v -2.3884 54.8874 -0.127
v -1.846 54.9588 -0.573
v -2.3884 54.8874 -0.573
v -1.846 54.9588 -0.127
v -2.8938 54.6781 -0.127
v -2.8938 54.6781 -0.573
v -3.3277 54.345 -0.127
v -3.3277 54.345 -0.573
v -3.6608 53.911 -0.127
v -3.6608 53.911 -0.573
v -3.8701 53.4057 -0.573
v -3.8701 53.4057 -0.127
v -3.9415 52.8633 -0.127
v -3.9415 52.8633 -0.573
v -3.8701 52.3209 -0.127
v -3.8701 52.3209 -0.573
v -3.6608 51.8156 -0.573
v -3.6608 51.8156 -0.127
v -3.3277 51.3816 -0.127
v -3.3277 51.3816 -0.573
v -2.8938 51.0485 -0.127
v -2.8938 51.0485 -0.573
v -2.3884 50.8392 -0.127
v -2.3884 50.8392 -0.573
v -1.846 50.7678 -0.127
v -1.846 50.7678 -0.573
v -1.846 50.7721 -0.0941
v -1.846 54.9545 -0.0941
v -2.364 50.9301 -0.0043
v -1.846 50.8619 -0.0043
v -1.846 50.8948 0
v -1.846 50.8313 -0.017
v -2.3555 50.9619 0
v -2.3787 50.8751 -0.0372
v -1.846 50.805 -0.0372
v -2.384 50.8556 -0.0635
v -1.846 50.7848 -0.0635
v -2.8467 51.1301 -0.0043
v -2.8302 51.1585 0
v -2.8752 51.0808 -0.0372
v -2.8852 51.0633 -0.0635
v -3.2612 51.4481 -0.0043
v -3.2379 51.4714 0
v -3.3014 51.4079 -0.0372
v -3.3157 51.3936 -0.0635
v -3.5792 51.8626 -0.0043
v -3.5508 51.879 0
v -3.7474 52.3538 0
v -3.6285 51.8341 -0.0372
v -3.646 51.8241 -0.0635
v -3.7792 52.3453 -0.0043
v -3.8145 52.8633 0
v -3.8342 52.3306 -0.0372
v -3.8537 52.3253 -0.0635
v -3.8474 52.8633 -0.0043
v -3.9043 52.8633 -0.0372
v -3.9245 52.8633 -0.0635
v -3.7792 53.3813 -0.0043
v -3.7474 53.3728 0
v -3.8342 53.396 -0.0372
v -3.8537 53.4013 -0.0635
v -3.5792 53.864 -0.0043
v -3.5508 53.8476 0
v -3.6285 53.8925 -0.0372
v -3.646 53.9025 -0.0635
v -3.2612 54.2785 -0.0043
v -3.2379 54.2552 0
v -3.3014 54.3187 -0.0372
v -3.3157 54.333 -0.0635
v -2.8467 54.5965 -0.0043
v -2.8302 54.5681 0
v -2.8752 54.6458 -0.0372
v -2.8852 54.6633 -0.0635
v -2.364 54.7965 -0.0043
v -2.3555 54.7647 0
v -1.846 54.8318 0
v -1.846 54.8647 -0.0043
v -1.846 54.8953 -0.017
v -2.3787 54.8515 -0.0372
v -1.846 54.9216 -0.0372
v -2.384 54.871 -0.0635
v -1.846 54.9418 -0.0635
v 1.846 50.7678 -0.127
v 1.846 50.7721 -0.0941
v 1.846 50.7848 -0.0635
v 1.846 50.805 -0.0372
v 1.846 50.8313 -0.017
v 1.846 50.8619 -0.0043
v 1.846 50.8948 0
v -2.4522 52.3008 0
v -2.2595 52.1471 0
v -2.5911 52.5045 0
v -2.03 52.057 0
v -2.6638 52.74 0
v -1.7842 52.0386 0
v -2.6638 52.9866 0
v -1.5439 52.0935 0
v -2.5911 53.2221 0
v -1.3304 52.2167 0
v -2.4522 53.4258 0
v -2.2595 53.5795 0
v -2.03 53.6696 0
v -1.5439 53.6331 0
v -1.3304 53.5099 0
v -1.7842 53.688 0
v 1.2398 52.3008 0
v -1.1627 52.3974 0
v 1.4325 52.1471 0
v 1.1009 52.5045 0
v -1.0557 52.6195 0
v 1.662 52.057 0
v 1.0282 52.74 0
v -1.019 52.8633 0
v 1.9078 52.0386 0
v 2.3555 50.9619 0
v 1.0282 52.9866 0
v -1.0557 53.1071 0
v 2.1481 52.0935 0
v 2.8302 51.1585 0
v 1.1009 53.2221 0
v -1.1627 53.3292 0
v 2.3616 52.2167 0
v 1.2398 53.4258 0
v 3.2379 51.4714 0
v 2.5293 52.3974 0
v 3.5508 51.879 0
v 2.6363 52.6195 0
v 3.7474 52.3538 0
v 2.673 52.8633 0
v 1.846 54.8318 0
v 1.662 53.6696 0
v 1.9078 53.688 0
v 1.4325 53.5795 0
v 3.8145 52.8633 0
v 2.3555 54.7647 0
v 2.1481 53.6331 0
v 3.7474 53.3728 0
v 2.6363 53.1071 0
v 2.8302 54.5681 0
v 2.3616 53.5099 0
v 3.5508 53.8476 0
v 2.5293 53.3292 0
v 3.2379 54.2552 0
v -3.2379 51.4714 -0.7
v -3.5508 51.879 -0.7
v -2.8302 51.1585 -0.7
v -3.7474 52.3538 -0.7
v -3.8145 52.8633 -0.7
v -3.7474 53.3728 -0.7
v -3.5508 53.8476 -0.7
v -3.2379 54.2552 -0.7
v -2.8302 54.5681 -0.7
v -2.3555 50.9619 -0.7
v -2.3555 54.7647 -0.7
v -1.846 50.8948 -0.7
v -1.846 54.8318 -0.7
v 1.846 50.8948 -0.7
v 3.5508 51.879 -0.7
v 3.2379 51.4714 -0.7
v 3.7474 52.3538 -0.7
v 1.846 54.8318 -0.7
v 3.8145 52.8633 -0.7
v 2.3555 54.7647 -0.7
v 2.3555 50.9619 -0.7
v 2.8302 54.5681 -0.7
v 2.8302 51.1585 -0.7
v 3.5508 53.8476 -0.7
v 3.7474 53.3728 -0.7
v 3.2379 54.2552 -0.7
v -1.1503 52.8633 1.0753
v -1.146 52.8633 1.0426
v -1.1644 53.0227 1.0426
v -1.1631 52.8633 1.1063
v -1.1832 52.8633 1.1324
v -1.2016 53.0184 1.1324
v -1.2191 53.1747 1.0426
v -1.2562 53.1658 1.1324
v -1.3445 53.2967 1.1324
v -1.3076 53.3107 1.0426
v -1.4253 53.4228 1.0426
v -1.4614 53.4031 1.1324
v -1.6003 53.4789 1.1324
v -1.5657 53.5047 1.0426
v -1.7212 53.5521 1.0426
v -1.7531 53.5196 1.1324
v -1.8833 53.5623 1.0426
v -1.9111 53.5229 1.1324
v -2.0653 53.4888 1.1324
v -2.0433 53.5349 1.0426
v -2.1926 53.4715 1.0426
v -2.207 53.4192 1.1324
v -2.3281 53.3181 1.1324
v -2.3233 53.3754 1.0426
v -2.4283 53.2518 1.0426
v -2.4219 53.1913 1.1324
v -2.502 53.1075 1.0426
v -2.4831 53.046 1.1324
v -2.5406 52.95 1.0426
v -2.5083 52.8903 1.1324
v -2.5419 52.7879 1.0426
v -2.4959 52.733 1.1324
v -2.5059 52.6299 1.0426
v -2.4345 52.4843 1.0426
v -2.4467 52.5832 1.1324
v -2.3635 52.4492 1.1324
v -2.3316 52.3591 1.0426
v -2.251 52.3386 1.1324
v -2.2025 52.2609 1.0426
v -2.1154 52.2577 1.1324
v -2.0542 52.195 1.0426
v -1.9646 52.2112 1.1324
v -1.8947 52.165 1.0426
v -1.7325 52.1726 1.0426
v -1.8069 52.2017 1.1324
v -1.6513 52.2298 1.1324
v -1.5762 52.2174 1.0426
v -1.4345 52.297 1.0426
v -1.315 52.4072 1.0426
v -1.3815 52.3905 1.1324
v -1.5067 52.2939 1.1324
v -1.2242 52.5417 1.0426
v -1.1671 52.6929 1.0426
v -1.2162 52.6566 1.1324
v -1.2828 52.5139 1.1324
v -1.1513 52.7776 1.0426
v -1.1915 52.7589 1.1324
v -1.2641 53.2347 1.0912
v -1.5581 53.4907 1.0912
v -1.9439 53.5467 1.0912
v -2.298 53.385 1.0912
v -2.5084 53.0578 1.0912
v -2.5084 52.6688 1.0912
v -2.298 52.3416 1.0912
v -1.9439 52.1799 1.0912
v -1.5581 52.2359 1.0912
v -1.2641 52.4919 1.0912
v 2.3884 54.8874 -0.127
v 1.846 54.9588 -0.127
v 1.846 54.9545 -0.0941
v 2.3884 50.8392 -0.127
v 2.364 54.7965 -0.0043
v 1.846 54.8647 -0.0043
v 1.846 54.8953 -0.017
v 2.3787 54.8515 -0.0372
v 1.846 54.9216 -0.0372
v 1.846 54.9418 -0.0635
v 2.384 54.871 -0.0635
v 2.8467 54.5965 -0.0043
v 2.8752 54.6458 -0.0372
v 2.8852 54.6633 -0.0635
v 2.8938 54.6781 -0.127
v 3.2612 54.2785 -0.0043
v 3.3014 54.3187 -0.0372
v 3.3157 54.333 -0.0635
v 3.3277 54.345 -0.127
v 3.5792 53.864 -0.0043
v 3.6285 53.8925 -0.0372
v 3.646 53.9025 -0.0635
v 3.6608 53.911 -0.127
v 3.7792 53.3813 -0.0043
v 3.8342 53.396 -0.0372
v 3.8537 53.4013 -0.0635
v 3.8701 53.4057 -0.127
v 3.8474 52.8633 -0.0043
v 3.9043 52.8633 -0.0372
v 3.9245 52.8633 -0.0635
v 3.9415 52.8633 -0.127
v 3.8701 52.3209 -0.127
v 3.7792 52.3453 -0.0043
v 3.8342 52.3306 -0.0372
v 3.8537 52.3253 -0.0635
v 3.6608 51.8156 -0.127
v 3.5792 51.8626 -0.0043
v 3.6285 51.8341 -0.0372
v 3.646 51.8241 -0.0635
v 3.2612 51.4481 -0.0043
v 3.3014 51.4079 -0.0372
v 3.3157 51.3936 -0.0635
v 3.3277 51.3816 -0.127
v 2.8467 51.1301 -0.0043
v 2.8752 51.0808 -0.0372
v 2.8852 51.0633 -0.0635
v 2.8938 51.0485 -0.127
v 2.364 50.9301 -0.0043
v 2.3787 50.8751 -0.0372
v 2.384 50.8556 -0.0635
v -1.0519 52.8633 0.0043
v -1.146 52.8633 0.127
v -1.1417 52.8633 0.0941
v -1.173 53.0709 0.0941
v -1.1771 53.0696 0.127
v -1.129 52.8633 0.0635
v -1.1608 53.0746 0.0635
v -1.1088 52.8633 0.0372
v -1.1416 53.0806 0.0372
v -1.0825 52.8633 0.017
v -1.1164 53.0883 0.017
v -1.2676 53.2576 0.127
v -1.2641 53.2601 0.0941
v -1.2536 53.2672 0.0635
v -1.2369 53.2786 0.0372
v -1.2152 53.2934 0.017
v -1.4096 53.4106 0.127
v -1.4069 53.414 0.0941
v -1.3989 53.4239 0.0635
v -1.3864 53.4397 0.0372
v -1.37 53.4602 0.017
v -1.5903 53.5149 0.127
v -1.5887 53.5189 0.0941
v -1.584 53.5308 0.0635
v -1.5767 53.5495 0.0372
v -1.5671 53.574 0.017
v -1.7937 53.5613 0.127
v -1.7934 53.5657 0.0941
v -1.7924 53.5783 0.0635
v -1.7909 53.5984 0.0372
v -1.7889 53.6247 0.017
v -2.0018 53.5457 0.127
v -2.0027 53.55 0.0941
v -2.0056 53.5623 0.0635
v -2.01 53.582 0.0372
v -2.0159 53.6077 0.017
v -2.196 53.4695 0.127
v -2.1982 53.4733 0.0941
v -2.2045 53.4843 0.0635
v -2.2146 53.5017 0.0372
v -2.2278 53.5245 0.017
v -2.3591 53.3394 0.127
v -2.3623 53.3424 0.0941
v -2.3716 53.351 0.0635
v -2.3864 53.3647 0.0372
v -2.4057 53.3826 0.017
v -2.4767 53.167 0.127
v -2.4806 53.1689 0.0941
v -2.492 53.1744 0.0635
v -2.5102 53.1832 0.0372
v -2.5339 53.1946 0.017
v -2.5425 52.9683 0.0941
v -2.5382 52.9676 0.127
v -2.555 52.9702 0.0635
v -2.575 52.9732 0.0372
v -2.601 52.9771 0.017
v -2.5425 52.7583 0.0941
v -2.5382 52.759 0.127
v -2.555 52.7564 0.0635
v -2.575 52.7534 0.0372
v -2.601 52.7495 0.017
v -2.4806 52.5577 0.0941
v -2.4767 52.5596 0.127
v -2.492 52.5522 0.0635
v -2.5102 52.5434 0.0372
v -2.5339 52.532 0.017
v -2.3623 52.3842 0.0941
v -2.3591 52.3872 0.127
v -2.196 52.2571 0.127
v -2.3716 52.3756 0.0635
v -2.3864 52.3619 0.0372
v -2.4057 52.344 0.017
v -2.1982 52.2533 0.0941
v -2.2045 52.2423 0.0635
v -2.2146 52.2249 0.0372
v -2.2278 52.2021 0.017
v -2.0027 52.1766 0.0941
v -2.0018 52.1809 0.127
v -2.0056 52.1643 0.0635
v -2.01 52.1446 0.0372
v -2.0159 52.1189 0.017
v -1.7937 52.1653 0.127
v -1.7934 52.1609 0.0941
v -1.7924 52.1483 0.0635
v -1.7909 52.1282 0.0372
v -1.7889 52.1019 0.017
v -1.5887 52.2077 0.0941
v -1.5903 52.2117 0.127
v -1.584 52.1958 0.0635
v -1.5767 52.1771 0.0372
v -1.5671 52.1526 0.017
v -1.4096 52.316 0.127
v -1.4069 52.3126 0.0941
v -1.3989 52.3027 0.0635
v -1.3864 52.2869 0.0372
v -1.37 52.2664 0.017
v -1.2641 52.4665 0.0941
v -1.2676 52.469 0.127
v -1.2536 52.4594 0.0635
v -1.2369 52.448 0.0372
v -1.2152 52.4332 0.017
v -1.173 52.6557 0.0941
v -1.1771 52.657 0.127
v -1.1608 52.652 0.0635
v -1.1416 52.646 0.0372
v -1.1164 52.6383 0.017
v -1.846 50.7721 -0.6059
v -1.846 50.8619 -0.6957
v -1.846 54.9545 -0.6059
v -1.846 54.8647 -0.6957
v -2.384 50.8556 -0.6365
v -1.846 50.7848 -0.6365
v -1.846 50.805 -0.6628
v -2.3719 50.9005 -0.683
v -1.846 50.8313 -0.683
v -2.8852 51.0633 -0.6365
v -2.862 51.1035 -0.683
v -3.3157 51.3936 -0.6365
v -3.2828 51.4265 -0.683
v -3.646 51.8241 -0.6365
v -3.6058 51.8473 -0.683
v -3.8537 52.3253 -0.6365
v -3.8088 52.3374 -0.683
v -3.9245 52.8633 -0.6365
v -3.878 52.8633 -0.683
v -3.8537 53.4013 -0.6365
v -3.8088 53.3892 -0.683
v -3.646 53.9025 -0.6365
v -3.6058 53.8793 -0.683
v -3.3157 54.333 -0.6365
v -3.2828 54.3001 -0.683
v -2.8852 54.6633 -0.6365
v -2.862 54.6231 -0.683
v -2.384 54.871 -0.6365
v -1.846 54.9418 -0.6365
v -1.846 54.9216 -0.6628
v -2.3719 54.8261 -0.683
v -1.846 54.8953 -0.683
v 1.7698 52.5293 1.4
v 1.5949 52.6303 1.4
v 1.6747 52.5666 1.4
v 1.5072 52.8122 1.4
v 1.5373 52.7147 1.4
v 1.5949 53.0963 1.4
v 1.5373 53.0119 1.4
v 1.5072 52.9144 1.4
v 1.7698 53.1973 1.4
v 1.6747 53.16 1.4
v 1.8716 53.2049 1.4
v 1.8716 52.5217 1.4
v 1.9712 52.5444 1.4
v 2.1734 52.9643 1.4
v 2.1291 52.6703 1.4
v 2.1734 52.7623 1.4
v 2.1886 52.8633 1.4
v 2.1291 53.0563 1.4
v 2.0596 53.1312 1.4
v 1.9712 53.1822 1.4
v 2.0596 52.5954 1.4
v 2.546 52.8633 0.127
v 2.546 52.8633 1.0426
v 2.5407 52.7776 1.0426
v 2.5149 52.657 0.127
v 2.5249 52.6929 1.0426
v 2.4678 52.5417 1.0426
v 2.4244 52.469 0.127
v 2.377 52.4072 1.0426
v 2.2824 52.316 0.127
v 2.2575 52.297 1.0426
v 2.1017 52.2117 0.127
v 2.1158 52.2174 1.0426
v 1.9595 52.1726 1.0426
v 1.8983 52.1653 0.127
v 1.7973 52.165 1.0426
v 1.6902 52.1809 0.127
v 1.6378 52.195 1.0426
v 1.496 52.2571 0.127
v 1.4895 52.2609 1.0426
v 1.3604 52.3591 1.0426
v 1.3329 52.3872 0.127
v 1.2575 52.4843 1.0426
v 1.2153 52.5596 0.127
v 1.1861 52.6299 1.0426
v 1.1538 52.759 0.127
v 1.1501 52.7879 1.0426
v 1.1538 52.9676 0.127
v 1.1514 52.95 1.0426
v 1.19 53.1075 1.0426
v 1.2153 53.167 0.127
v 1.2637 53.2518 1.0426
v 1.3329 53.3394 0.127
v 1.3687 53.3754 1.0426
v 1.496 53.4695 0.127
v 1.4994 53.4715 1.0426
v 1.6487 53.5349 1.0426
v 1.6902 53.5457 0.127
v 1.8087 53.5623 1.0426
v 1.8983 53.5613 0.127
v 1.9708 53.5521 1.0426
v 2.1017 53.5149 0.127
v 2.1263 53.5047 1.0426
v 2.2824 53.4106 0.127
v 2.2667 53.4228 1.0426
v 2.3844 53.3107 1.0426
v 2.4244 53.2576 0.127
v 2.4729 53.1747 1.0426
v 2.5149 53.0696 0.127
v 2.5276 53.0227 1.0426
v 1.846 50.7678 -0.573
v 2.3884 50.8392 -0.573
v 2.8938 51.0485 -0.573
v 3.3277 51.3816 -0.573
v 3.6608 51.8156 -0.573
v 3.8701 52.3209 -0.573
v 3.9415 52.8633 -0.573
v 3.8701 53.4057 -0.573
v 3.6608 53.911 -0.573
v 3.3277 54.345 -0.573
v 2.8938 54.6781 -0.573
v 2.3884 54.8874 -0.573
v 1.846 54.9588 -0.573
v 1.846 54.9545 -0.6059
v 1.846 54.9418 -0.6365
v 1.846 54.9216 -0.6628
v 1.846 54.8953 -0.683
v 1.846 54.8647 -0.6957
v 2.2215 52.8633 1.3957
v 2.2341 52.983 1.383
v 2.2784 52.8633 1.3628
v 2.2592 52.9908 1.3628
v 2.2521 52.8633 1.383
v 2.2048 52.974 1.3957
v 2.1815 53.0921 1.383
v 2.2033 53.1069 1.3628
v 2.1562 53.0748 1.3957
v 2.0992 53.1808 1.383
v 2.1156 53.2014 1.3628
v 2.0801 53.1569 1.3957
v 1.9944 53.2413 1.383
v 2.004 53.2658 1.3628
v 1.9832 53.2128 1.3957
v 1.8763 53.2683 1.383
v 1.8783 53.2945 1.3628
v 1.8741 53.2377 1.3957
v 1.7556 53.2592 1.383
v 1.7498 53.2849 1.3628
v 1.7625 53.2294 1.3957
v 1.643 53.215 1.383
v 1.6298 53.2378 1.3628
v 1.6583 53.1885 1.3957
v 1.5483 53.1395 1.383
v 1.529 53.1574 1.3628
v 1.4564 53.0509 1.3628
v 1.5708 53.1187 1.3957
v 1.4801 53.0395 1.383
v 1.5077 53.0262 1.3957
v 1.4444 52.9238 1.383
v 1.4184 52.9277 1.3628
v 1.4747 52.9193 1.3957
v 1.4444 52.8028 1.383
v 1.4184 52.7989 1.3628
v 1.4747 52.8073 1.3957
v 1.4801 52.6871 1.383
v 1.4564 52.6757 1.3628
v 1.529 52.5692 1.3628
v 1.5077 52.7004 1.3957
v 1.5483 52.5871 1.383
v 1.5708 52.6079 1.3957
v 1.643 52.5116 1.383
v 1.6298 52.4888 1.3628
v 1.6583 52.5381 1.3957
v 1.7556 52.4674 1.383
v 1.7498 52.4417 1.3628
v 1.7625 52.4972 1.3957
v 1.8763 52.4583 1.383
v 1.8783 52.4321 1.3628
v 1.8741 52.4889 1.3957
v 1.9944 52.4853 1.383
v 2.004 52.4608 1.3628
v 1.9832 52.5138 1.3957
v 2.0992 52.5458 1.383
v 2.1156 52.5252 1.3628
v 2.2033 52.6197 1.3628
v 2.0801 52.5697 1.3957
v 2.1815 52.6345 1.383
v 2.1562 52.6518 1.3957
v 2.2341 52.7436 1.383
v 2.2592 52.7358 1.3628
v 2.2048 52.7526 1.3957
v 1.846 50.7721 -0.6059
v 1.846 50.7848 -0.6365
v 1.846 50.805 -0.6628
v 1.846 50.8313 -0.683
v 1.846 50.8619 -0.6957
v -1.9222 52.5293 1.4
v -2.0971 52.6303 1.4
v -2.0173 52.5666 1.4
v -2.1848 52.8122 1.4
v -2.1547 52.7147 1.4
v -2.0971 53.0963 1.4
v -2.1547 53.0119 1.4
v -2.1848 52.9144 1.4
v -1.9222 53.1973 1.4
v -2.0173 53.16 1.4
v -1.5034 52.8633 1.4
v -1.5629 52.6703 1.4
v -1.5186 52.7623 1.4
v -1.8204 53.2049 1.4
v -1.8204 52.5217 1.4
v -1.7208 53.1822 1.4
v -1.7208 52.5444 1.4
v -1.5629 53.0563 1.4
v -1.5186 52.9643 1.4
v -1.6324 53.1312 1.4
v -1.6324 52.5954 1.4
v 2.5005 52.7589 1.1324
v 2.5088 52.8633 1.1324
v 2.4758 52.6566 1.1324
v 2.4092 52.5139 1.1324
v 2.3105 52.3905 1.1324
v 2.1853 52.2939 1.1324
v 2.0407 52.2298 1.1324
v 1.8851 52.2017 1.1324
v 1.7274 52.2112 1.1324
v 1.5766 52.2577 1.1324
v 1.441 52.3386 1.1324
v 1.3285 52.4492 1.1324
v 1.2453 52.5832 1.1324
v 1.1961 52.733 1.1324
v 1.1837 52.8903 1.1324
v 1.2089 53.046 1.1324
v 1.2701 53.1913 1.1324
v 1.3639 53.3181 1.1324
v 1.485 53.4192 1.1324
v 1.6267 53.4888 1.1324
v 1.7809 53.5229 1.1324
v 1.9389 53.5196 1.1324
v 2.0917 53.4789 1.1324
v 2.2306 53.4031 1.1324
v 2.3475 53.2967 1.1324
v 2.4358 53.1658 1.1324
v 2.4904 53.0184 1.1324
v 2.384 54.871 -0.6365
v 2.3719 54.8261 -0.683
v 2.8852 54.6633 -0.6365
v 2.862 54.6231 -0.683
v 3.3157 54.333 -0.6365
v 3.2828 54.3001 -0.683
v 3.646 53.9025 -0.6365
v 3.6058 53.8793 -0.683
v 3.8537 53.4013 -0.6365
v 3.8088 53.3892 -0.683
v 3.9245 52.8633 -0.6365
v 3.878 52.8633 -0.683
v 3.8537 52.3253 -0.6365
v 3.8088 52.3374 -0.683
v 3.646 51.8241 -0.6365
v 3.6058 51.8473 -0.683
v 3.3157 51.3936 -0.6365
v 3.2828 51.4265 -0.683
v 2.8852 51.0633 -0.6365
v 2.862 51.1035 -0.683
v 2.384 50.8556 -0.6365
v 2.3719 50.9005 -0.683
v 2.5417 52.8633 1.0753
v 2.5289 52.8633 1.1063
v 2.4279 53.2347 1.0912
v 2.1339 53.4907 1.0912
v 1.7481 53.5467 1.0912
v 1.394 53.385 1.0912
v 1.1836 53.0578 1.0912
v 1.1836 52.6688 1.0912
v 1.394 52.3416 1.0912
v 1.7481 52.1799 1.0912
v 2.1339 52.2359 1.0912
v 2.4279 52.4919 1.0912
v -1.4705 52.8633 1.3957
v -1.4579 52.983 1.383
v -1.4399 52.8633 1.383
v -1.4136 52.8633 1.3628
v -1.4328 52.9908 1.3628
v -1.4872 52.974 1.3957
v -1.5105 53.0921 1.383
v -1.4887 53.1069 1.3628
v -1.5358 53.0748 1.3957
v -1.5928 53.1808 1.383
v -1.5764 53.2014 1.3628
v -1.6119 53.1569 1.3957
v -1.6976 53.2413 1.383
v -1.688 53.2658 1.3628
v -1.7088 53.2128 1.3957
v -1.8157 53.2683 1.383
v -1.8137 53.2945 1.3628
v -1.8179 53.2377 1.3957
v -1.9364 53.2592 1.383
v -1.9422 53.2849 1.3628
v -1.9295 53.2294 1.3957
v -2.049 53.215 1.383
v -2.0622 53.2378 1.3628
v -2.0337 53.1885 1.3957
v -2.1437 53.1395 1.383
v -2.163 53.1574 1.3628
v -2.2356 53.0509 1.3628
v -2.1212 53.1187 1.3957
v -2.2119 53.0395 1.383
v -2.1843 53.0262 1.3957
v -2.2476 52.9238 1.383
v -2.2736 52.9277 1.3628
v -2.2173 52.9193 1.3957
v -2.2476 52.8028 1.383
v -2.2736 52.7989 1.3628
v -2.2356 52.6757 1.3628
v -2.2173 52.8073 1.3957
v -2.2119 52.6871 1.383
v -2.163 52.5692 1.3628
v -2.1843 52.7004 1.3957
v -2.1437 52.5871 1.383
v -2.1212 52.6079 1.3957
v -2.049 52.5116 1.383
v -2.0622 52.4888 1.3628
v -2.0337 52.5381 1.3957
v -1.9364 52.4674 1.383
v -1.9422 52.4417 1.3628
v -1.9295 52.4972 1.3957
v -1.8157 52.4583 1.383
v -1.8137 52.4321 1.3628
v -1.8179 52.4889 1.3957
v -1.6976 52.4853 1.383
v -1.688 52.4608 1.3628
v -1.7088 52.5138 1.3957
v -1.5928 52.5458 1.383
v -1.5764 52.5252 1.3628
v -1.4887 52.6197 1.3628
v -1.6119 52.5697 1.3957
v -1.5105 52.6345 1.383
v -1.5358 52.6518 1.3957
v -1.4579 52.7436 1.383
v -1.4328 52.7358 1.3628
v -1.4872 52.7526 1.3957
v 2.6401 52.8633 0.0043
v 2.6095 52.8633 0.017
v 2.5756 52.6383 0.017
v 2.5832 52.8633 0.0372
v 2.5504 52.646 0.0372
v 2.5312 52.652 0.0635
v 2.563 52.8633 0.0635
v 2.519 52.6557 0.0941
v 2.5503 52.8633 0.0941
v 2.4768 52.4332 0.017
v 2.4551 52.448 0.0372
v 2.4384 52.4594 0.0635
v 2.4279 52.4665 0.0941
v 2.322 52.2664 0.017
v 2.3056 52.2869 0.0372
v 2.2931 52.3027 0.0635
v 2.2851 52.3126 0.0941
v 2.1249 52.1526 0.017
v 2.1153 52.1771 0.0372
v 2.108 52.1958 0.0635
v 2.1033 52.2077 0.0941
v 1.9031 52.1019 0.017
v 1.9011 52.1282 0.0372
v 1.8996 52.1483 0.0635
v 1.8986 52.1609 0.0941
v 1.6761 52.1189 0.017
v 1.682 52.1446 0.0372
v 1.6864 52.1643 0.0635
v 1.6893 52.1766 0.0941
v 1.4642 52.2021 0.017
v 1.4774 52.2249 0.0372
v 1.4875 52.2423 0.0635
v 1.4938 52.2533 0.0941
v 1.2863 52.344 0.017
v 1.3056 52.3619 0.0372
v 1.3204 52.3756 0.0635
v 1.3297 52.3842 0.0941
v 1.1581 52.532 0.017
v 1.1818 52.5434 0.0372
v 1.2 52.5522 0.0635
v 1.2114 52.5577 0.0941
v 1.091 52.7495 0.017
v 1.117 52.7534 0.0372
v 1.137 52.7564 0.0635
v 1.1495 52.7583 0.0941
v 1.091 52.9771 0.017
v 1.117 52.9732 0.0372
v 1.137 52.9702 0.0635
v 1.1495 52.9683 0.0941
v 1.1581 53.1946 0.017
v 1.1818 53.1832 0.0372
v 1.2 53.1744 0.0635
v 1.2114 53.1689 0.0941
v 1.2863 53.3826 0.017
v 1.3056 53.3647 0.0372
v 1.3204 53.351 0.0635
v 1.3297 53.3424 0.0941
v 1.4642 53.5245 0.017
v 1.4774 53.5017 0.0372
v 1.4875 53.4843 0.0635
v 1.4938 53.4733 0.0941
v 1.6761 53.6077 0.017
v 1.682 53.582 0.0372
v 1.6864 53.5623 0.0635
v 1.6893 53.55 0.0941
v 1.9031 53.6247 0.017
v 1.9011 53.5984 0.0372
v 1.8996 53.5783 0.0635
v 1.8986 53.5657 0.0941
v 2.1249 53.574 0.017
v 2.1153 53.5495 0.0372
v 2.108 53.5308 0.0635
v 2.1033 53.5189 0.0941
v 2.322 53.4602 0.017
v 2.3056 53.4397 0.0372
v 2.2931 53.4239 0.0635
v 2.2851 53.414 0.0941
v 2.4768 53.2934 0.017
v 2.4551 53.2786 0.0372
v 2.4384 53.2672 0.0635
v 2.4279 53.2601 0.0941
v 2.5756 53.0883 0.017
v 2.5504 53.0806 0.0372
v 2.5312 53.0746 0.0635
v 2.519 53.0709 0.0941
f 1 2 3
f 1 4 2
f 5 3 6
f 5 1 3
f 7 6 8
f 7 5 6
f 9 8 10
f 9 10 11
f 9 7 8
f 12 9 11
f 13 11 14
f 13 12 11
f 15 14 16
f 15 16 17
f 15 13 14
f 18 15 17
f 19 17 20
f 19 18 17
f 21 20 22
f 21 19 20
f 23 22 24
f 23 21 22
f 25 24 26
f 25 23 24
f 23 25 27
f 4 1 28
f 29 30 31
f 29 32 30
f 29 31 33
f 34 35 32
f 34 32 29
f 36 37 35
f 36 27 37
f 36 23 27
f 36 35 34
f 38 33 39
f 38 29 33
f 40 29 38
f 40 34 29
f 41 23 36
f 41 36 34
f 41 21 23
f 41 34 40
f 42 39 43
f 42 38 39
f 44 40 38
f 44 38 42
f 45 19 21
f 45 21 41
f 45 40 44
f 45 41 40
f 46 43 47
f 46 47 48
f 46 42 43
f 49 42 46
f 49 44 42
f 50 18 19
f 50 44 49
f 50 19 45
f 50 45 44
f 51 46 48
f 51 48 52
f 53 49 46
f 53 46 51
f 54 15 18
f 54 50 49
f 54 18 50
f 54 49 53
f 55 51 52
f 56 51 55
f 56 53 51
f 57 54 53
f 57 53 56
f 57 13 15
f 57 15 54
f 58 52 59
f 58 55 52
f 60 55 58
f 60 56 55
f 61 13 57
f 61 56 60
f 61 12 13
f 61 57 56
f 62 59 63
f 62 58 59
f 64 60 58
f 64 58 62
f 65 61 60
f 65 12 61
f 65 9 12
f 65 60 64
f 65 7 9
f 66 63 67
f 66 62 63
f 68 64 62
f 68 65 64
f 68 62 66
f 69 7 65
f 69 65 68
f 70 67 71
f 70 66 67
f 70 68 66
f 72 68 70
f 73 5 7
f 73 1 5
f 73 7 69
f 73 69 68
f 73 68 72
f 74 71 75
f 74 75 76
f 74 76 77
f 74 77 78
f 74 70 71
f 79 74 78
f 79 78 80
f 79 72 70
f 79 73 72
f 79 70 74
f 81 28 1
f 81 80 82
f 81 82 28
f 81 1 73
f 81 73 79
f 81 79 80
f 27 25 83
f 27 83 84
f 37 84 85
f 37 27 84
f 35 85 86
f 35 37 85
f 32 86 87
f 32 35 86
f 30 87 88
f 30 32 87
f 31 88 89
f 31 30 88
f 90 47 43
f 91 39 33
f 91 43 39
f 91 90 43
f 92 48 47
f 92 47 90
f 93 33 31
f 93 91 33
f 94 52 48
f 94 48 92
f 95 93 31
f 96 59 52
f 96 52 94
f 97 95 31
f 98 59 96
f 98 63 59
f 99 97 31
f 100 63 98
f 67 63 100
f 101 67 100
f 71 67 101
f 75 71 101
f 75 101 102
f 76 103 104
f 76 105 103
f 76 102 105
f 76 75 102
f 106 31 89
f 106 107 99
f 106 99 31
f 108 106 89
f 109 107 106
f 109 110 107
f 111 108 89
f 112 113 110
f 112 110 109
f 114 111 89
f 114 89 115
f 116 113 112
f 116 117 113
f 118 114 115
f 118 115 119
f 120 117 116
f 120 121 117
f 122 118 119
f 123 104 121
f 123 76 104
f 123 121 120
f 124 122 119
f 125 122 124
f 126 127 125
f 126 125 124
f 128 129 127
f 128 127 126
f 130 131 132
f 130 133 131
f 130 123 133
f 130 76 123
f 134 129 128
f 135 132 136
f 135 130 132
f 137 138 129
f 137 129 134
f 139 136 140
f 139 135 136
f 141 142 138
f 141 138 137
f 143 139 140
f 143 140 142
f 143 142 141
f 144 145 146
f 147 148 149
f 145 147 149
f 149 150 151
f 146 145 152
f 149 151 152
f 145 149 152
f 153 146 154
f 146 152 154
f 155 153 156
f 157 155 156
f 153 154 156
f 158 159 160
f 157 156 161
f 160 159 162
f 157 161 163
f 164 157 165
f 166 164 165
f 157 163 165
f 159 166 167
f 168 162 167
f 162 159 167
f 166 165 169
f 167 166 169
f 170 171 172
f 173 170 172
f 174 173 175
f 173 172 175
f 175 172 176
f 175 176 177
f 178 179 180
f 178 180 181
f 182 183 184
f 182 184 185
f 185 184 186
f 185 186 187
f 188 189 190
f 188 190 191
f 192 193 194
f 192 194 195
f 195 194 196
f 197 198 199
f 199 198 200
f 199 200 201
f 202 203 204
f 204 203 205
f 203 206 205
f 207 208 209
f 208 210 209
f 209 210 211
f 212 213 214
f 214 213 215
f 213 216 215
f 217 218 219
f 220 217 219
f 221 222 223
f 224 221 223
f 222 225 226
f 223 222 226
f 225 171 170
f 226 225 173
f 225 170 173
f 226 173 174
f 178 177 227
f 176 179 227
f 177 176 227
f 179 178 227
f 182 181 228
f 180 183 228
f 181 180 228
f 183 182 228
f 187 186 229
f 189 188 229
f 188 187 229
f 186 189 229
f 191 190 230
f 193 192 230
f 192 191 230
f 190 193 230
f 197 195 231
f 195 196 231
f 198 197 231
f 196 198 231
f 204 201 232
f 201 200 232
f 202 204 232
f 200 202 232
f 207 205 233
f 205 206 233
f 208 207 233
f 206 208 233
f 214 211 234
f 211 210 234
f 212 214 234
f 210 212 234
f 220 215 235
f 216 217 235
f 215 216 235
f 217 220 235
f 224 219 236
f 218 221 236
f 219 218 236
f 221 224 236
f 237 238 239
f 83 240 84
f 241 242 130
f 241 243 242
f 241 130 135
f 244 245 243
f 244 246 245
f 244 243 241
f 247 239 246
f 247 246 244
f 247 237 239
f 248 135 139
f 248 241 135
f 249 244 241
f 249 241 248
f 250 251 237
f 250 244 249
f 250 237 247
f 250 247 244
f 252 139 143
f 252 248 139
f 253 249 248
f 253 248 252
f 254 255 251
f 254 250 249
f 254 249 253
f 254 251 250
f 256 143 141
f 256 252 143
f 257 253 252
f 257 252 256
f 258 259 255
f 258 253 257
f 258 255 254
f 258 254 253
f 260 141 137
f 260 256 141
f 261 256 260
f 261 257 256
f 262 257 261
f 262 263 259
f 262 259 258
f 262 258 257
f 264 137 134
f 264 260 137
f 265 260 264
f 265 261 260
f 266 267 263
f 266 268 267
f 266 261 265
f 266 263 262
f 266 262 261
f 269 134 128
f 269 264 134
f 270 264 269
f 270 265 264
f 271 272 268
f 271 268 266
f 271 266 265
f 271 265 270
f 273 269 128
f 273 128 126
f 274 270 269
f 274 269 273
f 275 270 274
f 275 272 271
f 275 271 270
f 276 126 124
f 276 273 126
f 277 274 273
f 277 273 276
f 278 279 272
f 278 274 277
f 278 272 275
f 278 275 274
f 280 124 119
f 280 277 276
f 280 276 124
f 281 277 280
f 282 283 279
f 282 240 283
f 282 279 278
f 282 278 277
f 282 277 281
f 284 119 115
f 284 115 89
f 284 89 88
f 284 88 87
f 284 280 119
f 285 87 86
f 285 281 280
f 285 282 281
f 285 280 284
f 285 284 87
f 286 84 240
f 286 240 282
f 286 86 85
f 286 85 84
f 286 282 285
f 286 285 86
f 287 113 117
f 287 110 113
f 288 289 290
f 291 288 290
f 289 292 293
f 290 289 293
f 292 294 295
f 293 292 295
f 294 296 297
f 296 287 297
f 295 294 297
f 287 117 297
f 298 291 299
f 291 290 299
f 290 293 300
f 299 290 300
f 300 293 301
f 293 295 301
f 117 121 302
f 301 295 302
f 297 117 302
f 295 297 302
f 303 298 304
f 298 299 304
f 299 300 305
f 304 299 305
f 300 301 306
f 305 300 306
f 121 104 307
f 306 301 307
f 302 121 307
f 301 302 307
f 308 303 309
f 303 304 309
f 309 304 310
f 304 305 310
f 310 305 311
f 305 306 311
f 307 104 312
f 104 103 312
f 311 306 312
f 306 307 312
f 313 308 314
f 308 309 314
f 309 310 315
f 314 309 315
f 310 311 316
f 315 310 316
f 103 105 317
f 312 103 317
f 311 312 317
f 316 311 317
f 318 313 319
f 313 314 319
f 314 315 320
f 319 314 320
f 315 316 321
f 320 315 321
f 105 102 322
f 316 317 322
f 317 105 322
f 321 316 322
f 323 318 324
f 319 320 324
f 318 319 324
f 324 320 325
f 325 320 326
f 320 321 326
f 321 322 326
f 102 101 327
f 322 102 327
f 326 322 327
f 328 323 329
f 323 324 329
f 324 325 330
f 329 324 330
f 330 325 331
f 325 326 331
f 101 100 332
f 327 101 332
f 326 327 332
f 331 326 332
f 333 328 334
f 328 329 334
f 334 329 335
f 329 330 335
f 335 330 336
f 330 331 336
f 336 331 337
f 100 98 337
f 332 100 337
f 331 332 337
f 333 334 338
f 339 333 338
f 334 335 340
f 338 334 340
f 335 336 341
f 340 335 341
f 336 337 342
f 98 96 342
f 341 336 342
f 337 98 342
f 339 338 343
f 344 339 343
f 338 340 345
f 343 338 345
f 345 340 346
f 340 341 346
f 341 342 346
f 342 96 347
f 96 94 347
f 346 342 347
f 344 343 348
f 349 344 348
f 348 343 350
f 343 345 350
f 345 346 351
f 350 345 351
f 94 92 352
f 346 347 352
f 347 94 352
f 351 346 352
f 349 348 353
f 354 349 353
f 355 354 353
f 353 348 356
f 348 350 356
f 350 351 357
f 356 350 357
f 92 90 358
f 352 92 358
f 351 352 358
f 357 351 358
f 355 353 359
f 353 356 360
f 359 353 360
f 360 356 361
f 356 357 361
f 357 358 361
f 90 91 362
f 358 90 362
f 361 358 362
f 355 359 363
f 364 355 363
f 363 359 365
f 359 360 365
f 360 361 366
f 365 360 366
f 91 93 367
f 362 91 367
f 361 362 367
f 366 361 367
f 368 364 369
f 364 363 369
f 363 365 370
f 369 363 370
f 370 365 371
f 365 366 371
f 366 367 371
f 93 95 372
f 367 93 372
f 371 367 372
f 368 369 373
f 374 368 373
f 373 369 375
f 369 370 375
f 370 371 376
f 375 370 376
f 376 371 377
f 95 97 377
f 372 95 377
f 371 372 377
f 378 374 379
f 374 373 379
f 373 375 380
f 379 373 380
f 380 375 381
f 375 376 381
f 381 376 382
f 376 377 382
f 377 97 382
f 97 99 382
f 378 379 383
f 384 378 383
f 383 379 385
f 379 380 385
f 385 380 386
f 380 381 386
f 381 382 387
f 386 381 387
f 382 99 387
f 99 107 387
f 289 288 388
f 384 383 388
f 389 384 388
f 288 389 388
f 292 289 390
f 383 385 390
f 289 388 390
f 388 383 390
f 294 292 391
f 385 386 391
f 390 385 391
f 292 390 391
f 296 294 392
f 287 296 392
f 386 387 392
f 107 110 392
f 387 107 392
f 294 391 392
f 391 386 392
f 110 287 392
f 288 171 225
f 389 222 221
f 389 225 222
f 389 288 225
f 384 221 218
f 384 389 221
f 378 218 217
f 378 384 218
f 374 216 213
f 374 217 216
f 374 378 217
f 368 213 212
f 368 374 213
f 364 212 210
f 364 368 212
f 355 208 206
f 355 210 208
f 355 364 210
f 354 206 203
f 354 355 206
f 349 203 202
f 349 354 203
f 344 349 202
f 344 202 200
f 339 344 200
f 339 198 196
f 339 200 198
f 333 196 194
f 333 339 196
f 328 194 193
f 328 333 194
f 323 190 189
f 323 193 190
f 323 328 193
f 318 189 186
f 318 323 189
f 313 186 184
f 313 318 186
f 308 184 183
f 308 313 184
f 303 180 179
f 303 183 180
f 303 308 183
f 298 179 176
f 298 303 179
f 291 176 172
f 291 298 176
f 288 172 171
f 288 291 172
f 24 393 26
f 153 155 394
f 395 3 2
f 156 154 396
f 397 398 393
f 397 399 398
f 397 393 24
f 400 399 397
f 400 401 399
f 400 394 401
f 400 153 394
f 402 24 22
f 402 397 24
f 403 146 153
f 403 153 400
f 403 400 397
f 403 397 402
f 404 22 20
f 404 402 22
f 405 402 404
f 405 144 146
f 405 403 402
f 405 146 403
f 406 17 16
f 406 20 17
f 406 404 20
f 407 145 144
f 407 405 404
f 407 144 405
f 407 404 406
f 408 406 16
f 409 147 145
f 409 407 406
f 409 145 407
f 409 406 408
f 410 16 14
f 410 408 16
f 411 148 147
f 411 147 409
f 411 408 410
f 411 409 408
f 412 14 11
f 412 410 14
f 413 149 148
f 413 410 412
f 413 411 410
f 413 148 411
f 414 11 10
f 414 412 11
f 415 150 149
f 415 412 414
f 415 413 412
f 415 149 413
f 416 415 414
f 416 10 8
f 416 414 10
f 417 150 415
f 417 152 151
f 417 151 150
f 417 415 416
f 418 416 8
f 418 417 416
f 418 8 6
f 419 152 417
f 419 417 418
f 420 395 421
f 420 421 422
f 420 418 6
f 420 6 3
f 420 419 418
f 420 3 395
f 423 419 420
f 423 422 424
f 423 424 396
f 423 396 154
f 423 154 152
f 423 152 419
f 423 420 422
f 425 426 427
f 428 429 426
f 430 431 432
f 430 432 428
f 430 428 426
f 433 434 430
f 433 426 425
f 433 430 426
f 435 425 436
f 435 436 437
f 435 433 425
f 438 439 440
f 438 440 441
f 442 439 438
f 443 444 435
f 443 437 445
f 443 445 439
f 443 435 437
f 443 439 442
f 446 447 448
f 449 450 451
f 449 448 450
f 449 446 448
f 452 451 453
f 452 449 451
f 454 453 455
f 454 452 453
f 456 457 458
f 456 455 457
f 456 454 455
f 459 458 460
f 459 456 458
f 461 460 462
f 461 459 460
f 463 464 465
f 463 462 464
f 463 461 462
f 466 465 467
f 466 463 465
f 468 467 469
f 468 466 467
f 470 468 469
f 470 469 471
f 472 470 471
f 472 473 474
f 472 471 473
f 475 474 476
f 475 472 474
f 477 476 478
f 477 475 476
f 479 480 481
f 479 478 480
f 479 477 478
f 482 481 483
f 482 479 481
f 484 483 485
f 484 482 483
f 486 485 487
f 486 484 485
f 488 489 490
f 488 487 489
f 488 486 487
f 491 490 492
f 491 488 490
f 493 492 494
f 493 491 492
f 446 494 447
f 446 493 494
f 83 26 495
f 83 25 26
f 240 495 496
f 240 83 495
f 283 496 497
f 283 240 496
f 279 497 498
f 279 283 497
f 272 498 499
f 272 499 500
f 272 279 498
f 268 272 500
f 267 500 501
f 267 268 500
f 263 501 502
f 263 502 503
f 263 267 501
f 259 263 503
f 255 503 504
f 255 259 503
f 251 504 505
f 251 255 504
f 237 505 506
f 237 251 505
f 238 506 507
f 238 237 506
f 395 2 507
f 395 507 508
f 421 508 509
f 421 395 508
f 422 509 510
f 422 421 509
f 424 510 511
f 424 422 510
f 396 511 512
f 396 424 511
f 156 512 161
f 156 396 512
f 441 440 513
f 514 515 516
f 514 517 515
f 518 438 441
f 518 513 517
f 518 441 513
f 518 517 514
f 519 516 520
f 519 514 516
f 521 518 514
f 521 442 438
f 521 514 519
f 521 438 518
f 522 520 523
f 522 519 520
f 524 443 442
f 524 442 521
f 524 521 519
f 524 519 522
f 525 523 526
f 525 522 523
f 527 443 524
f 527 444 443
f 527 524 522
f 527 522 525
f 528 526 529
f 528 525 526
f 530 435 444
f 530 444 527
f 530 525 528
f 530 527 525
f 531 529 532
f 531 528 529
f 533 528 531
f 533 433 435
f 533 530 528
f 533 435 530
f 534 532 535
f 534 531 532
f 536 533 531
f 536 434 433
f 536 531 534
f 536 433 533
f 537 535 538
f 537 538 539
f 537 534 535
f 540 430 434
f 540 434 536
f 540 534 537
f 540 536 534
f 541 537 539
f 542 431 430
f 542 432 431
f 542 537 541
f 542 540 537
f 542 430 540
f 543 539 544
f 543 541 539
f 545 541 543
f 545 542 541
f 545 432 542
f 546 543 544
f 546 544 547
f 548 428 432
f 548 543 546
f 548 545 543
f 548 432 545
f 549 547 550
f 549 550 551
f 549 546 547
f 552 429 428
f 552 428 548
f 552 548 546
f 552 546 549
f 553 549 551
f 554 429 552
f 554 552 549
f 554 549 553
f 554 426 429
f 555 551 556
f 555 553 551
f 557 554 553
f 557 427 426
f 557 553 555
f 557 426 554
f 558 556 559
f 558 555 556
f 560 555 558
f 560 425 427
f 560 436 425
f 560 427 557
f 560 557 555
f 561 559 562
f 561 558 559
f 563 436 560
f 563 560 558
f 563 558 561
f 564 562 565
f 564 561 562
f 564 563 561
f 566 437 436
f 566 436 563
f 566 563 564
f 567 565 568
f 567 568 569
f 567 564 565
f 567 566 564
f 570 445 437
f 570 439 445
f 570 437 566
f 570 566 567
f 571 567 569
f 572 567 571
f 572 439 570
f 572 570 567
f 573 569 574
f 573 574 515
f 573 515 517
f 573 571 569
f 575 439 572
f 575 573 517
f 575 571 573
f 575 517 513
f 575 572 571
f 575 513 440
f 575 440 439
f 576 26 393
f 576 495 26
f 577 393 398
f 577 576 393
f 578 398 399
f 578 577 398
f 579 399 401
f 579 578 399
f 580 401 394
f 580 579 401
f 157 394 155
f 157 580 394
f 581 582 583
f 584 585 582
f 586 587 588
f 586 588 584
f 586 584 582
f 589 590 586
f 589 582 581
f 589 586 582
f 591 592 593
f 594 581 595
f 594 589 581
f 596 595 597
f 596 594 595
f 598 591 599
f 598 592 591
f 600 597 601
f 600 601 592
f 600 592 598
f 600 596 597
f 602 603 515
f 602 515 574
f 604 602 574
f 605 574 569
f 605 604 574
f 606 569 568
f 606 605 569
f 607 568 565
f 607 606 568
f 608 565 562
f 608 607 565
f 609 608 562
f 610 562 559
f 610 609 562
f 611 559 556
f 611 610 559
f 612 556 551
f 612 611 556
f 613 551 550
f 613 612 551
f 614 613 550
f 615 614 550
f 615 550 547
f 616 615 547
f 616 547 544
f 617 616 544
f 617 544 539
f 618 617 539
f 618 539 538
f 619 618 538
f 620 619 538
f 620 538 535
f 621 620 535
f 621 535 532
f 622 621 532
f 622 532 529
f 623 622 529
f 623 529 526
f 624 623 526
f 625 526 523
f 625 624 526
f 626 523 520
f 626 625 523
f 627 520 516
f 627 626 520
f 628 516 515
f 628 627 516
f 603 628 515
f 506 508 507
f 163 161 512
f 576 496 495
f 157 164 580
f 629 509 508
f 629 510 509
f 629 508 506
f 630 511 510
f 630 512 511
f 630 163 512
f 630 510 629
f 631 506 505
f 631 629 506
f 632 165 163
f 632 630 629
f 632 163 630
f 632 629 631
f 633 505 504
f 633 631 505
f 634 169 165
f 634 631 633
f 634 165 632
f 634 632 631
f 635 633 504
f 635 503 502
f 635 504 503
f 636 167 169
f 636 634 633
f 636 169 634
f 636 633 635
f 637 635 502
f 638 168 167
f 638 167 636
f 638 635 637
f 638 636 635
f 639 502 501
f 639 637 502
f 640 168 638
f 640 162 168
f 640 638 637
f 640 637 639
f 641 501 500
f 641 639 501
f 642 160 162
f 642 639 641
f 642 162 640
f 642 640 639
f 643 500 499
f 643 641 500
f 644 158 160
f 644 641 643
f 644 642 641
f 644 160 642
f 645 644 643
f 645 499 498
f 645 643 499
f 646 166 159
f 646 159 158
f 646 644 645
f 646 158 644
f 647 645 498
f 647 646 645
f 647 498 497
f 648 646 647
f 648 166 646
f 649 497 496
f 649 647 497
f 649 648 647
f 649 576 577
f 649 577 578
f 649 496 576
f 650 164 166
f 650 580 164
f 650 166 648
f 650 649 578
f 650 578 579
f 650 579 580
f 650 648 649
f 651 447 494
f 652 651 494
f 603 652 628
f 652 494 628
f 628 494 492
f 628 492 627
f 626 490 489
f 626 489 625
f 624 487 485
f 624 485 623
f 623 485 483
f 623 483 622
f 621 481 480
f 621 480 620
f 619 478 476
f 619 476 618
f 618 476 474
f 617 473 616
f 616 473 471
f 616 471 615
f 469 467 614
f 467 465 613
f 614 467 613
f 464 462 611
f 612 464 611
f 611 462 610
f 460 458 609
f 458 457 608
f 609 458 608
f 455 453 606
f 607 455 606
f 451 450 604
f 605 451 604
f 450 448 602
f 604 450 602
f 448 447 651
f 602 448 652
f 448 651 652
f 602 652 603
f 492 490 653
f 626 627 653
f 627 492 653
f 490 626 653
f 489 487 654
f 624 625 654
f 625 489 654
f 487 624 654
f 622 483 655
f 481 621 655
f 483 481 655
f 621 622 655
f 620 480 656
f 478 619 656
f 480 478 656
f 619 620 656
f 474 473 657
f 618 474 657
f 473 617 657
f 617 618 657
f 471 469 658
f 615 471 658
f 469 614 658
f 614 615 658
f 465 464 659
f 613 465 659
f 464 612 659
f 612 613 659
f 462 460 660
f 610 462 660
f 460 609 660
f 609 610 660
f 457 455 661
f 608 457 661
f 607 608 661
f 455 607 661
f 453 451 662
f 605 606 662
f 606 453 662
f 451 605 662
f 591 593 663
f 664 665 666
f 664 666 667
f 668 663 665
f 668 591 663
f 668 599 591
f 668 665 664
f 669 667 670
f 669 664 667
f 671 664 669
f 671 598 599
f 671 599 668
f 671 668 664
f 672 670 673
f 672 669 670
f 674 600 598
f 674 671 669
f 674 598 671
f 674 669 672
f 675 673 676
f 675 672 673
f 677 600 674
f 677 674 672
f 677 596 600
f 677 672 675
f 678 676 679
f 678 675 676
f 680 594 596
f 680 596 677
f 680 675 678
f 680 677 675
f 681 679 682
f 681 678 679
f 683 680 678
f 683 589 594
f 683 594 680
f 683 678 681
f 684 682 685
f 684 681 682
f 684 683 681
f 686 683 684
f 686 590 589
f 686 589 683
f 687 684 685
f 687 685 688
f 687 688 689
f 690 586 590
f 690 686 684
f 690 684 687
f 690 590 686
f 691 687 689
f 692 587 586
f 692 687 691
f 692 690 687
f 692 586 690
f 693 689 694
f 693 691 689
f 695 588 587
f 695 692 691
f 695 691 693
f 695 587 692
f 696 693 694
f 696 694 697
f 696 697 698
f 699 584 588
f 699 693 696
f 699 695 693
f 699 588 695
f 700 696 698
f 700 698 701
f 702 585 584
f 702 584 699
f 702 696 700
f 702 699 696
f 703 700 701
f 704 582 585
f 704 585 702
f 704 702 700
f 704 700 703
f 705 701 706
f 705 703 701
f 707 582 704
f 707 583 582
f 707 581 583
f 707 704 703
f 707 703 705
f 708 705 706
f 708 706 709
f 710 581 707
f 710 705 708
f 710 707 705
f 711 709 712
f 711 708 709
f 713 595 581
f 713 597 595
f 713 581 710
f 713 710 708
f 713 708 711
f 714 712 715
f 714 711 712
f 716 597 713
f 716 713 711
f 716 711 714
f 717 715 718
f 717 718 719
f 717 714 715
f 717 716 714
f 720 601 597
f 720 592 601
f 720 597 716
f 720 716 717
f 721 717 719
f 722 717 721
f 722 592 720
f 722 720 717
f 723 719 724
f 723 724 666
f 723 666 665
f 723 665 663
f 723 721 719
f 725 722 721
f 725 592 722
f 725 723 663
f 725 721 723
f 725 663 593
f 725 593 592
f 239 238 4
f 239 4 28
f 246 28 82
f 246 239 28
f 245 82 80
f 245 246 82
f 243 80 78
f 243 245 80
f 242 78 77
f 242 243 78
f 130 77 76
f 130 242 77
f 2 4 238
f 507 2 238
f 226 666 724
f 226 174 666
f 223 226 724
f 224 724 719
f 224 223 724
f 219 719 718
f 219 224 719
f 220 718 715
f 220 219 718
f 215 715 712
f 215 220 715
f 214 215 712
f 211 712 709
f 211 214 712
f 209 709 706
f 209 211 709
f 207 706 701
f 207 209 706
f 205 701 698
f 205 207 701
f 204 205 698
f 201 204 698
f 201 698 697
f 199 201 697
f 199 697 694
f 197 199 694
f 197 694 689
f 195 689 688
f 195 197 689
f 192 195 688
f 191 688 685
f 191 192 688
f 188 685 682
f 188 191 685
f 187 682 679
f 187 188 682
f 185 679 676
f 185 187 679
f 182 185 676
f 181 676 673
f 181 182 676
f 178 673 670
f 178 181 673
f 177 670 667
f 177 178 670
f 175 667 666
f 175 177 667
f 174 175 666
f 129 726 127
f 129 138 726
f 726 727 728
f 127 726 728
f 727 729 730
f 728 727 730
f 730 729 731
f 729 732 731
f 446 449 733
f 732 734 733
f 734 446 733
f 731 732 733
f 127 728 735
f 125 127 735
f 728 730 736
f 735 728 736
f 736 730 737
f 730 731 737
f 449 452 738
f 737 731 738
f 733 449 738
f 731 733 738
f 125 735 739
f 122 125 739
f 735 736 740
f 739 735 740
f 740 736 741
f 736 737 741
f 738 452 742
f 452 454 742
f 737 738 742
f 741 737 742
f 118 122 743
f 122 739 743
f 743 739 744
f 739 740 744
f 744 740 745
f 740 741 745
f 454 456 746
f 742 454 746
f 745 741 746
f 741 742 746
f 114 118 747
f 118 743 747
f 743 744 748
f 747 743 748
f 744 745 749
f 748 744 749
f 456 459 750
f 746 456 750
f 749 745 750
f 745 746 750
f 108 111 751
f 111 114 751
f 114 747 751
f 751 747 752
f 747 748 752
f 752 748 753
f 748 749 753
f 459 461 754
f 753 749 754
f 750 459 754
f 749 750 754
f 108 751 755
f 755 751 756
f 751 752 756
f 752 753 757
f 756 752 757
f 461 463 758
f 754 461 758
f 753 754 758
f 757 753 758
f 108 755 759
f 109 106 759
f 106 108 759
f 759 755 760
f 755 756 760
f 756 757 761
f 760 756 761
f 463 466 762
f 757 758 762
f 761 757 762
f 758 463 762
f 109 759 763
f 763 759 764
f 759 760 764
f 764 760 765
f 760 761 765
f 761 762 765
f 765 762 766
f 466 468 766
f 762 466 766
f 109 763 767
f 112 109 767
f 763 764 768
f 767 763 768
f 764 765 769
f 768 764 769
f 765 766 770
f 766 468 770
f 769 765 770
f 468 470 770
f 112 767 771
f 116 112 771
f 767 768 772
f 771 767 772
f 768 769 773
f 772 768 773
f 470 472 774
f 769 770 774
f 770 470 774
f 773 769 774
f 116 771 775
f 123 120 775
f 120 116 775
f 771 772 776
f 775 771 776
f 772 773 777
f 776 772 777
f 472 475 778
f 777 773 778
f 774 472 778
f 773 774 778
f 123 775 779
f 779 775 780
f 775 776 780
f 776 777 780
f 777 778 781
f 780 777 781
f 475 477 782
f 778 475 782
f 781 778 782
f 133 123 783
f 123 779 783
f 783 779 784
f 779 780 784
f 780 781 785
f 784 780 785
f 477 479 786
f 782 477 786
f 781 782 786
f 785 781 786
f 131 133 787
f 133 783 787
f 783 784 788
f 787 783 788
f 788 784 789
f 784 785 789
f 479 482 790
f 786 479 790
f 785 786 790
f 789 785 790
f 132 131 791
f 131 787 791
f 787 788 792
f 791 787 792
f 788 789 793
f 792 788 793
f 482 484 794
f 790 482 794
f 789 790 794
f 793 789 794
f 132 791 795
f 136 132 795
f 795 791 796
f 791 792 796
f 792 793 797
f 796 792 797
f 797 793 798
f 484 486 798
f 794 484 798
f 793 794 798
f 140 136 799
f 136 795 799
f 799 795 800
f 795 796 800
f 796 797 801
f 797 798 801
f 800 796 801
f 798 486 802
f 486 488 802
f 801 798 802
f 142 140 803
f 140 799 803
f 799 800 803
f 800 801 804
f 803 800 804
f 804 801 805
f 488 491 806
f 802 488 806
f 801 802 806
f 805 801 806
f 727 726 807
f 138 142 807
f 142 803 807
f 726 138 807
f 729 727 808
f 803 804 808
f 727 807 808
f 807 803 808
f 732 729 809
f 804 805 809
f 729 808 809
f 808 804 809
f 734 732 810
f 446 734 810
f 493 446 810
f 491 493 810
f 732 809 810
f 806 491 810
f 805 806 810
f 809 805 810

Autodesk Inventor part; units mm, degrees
ref_plane "YZ Plane" through (0, 0, 0) normal (1, 0, 0) x (0, 1, 0)
ref_plane "XZ Plane" through (0, 0, 0) normal (0, 1, 0) x (-1, 0, 0)
ref_plane "XY Plane" through (0, 0, 0) normal (0, 0, 1) x (1, 0, 0)
sketch "Sketch1" plane through (0, 0, 0) normal (0, 0, 1) x (1, 0, 0)
  arc A0 (-1.846, 54.9588) -> (-1.846, 50.7678) centre (-1.846, 52.8633) ccw
  arc A1 (1.846, 50.7678) -> (1.846, 54.9588) centre (1.846, 52.8633) ccw
  line L0 (0, -74.4664) -> (0, 76.5296) construction
  line L1 (-74.0537, 0) -> (74.0537, 0) construction
  circle A2 centre (0, 0) radius 52.8955 construction
  circle A3 centre (-1.846, 52.8633) radius 0.7
  circle A4 centre (1.846, 52.8633) radius 0.7
  line L2 (-1.846, 54.9588) -> (1.846, 54.9588)
  line L3 (-1.846, 50.7678) -> (1.846, 50.7678)
  dimension "d3" = 1.4
  dimension "d4" = 4
  dimension "d12" = 4.191
  dimension "d13" = 105.791
extrude "Extrusion1" add sketch "Sketch1" against normal blind 0.7 contours L2 A1 L3 A0 | A3 | A4
extrude "Extrusion2" add sketch "Sketch1" along normal blind 1.4 contours A3 | A4
chamfer "Chamfer1" distance 0.3048 angle 45 2 edges at (-2.546, 52.8633, 1.4) (1.146, 52.8633, 1.4)
fillet "Fillet1" radius 0.127 14 edges at (0, 54.9588, 0) (3.9415, 52.8633, 0) (0, 50.7678, 0) (-3.9415, 52.8633, 0) (0, 50.7678, -0.7) (3.9415, 52.8633, -0.7) (0, 54.9588, -0.7) (-3.9415, 52.8633, -0.7) (-2.546, 52.8633, 0) (1.146, 52.8633, 0) (1.146, 52.8633, 1.0952) (1.4508, 52.8633, 1.4) (-2.546, 52.8633, 1.0952) (-2.2412, 52.8633, 1.4)
properties part number "J005537" material "VERO WHITE"
